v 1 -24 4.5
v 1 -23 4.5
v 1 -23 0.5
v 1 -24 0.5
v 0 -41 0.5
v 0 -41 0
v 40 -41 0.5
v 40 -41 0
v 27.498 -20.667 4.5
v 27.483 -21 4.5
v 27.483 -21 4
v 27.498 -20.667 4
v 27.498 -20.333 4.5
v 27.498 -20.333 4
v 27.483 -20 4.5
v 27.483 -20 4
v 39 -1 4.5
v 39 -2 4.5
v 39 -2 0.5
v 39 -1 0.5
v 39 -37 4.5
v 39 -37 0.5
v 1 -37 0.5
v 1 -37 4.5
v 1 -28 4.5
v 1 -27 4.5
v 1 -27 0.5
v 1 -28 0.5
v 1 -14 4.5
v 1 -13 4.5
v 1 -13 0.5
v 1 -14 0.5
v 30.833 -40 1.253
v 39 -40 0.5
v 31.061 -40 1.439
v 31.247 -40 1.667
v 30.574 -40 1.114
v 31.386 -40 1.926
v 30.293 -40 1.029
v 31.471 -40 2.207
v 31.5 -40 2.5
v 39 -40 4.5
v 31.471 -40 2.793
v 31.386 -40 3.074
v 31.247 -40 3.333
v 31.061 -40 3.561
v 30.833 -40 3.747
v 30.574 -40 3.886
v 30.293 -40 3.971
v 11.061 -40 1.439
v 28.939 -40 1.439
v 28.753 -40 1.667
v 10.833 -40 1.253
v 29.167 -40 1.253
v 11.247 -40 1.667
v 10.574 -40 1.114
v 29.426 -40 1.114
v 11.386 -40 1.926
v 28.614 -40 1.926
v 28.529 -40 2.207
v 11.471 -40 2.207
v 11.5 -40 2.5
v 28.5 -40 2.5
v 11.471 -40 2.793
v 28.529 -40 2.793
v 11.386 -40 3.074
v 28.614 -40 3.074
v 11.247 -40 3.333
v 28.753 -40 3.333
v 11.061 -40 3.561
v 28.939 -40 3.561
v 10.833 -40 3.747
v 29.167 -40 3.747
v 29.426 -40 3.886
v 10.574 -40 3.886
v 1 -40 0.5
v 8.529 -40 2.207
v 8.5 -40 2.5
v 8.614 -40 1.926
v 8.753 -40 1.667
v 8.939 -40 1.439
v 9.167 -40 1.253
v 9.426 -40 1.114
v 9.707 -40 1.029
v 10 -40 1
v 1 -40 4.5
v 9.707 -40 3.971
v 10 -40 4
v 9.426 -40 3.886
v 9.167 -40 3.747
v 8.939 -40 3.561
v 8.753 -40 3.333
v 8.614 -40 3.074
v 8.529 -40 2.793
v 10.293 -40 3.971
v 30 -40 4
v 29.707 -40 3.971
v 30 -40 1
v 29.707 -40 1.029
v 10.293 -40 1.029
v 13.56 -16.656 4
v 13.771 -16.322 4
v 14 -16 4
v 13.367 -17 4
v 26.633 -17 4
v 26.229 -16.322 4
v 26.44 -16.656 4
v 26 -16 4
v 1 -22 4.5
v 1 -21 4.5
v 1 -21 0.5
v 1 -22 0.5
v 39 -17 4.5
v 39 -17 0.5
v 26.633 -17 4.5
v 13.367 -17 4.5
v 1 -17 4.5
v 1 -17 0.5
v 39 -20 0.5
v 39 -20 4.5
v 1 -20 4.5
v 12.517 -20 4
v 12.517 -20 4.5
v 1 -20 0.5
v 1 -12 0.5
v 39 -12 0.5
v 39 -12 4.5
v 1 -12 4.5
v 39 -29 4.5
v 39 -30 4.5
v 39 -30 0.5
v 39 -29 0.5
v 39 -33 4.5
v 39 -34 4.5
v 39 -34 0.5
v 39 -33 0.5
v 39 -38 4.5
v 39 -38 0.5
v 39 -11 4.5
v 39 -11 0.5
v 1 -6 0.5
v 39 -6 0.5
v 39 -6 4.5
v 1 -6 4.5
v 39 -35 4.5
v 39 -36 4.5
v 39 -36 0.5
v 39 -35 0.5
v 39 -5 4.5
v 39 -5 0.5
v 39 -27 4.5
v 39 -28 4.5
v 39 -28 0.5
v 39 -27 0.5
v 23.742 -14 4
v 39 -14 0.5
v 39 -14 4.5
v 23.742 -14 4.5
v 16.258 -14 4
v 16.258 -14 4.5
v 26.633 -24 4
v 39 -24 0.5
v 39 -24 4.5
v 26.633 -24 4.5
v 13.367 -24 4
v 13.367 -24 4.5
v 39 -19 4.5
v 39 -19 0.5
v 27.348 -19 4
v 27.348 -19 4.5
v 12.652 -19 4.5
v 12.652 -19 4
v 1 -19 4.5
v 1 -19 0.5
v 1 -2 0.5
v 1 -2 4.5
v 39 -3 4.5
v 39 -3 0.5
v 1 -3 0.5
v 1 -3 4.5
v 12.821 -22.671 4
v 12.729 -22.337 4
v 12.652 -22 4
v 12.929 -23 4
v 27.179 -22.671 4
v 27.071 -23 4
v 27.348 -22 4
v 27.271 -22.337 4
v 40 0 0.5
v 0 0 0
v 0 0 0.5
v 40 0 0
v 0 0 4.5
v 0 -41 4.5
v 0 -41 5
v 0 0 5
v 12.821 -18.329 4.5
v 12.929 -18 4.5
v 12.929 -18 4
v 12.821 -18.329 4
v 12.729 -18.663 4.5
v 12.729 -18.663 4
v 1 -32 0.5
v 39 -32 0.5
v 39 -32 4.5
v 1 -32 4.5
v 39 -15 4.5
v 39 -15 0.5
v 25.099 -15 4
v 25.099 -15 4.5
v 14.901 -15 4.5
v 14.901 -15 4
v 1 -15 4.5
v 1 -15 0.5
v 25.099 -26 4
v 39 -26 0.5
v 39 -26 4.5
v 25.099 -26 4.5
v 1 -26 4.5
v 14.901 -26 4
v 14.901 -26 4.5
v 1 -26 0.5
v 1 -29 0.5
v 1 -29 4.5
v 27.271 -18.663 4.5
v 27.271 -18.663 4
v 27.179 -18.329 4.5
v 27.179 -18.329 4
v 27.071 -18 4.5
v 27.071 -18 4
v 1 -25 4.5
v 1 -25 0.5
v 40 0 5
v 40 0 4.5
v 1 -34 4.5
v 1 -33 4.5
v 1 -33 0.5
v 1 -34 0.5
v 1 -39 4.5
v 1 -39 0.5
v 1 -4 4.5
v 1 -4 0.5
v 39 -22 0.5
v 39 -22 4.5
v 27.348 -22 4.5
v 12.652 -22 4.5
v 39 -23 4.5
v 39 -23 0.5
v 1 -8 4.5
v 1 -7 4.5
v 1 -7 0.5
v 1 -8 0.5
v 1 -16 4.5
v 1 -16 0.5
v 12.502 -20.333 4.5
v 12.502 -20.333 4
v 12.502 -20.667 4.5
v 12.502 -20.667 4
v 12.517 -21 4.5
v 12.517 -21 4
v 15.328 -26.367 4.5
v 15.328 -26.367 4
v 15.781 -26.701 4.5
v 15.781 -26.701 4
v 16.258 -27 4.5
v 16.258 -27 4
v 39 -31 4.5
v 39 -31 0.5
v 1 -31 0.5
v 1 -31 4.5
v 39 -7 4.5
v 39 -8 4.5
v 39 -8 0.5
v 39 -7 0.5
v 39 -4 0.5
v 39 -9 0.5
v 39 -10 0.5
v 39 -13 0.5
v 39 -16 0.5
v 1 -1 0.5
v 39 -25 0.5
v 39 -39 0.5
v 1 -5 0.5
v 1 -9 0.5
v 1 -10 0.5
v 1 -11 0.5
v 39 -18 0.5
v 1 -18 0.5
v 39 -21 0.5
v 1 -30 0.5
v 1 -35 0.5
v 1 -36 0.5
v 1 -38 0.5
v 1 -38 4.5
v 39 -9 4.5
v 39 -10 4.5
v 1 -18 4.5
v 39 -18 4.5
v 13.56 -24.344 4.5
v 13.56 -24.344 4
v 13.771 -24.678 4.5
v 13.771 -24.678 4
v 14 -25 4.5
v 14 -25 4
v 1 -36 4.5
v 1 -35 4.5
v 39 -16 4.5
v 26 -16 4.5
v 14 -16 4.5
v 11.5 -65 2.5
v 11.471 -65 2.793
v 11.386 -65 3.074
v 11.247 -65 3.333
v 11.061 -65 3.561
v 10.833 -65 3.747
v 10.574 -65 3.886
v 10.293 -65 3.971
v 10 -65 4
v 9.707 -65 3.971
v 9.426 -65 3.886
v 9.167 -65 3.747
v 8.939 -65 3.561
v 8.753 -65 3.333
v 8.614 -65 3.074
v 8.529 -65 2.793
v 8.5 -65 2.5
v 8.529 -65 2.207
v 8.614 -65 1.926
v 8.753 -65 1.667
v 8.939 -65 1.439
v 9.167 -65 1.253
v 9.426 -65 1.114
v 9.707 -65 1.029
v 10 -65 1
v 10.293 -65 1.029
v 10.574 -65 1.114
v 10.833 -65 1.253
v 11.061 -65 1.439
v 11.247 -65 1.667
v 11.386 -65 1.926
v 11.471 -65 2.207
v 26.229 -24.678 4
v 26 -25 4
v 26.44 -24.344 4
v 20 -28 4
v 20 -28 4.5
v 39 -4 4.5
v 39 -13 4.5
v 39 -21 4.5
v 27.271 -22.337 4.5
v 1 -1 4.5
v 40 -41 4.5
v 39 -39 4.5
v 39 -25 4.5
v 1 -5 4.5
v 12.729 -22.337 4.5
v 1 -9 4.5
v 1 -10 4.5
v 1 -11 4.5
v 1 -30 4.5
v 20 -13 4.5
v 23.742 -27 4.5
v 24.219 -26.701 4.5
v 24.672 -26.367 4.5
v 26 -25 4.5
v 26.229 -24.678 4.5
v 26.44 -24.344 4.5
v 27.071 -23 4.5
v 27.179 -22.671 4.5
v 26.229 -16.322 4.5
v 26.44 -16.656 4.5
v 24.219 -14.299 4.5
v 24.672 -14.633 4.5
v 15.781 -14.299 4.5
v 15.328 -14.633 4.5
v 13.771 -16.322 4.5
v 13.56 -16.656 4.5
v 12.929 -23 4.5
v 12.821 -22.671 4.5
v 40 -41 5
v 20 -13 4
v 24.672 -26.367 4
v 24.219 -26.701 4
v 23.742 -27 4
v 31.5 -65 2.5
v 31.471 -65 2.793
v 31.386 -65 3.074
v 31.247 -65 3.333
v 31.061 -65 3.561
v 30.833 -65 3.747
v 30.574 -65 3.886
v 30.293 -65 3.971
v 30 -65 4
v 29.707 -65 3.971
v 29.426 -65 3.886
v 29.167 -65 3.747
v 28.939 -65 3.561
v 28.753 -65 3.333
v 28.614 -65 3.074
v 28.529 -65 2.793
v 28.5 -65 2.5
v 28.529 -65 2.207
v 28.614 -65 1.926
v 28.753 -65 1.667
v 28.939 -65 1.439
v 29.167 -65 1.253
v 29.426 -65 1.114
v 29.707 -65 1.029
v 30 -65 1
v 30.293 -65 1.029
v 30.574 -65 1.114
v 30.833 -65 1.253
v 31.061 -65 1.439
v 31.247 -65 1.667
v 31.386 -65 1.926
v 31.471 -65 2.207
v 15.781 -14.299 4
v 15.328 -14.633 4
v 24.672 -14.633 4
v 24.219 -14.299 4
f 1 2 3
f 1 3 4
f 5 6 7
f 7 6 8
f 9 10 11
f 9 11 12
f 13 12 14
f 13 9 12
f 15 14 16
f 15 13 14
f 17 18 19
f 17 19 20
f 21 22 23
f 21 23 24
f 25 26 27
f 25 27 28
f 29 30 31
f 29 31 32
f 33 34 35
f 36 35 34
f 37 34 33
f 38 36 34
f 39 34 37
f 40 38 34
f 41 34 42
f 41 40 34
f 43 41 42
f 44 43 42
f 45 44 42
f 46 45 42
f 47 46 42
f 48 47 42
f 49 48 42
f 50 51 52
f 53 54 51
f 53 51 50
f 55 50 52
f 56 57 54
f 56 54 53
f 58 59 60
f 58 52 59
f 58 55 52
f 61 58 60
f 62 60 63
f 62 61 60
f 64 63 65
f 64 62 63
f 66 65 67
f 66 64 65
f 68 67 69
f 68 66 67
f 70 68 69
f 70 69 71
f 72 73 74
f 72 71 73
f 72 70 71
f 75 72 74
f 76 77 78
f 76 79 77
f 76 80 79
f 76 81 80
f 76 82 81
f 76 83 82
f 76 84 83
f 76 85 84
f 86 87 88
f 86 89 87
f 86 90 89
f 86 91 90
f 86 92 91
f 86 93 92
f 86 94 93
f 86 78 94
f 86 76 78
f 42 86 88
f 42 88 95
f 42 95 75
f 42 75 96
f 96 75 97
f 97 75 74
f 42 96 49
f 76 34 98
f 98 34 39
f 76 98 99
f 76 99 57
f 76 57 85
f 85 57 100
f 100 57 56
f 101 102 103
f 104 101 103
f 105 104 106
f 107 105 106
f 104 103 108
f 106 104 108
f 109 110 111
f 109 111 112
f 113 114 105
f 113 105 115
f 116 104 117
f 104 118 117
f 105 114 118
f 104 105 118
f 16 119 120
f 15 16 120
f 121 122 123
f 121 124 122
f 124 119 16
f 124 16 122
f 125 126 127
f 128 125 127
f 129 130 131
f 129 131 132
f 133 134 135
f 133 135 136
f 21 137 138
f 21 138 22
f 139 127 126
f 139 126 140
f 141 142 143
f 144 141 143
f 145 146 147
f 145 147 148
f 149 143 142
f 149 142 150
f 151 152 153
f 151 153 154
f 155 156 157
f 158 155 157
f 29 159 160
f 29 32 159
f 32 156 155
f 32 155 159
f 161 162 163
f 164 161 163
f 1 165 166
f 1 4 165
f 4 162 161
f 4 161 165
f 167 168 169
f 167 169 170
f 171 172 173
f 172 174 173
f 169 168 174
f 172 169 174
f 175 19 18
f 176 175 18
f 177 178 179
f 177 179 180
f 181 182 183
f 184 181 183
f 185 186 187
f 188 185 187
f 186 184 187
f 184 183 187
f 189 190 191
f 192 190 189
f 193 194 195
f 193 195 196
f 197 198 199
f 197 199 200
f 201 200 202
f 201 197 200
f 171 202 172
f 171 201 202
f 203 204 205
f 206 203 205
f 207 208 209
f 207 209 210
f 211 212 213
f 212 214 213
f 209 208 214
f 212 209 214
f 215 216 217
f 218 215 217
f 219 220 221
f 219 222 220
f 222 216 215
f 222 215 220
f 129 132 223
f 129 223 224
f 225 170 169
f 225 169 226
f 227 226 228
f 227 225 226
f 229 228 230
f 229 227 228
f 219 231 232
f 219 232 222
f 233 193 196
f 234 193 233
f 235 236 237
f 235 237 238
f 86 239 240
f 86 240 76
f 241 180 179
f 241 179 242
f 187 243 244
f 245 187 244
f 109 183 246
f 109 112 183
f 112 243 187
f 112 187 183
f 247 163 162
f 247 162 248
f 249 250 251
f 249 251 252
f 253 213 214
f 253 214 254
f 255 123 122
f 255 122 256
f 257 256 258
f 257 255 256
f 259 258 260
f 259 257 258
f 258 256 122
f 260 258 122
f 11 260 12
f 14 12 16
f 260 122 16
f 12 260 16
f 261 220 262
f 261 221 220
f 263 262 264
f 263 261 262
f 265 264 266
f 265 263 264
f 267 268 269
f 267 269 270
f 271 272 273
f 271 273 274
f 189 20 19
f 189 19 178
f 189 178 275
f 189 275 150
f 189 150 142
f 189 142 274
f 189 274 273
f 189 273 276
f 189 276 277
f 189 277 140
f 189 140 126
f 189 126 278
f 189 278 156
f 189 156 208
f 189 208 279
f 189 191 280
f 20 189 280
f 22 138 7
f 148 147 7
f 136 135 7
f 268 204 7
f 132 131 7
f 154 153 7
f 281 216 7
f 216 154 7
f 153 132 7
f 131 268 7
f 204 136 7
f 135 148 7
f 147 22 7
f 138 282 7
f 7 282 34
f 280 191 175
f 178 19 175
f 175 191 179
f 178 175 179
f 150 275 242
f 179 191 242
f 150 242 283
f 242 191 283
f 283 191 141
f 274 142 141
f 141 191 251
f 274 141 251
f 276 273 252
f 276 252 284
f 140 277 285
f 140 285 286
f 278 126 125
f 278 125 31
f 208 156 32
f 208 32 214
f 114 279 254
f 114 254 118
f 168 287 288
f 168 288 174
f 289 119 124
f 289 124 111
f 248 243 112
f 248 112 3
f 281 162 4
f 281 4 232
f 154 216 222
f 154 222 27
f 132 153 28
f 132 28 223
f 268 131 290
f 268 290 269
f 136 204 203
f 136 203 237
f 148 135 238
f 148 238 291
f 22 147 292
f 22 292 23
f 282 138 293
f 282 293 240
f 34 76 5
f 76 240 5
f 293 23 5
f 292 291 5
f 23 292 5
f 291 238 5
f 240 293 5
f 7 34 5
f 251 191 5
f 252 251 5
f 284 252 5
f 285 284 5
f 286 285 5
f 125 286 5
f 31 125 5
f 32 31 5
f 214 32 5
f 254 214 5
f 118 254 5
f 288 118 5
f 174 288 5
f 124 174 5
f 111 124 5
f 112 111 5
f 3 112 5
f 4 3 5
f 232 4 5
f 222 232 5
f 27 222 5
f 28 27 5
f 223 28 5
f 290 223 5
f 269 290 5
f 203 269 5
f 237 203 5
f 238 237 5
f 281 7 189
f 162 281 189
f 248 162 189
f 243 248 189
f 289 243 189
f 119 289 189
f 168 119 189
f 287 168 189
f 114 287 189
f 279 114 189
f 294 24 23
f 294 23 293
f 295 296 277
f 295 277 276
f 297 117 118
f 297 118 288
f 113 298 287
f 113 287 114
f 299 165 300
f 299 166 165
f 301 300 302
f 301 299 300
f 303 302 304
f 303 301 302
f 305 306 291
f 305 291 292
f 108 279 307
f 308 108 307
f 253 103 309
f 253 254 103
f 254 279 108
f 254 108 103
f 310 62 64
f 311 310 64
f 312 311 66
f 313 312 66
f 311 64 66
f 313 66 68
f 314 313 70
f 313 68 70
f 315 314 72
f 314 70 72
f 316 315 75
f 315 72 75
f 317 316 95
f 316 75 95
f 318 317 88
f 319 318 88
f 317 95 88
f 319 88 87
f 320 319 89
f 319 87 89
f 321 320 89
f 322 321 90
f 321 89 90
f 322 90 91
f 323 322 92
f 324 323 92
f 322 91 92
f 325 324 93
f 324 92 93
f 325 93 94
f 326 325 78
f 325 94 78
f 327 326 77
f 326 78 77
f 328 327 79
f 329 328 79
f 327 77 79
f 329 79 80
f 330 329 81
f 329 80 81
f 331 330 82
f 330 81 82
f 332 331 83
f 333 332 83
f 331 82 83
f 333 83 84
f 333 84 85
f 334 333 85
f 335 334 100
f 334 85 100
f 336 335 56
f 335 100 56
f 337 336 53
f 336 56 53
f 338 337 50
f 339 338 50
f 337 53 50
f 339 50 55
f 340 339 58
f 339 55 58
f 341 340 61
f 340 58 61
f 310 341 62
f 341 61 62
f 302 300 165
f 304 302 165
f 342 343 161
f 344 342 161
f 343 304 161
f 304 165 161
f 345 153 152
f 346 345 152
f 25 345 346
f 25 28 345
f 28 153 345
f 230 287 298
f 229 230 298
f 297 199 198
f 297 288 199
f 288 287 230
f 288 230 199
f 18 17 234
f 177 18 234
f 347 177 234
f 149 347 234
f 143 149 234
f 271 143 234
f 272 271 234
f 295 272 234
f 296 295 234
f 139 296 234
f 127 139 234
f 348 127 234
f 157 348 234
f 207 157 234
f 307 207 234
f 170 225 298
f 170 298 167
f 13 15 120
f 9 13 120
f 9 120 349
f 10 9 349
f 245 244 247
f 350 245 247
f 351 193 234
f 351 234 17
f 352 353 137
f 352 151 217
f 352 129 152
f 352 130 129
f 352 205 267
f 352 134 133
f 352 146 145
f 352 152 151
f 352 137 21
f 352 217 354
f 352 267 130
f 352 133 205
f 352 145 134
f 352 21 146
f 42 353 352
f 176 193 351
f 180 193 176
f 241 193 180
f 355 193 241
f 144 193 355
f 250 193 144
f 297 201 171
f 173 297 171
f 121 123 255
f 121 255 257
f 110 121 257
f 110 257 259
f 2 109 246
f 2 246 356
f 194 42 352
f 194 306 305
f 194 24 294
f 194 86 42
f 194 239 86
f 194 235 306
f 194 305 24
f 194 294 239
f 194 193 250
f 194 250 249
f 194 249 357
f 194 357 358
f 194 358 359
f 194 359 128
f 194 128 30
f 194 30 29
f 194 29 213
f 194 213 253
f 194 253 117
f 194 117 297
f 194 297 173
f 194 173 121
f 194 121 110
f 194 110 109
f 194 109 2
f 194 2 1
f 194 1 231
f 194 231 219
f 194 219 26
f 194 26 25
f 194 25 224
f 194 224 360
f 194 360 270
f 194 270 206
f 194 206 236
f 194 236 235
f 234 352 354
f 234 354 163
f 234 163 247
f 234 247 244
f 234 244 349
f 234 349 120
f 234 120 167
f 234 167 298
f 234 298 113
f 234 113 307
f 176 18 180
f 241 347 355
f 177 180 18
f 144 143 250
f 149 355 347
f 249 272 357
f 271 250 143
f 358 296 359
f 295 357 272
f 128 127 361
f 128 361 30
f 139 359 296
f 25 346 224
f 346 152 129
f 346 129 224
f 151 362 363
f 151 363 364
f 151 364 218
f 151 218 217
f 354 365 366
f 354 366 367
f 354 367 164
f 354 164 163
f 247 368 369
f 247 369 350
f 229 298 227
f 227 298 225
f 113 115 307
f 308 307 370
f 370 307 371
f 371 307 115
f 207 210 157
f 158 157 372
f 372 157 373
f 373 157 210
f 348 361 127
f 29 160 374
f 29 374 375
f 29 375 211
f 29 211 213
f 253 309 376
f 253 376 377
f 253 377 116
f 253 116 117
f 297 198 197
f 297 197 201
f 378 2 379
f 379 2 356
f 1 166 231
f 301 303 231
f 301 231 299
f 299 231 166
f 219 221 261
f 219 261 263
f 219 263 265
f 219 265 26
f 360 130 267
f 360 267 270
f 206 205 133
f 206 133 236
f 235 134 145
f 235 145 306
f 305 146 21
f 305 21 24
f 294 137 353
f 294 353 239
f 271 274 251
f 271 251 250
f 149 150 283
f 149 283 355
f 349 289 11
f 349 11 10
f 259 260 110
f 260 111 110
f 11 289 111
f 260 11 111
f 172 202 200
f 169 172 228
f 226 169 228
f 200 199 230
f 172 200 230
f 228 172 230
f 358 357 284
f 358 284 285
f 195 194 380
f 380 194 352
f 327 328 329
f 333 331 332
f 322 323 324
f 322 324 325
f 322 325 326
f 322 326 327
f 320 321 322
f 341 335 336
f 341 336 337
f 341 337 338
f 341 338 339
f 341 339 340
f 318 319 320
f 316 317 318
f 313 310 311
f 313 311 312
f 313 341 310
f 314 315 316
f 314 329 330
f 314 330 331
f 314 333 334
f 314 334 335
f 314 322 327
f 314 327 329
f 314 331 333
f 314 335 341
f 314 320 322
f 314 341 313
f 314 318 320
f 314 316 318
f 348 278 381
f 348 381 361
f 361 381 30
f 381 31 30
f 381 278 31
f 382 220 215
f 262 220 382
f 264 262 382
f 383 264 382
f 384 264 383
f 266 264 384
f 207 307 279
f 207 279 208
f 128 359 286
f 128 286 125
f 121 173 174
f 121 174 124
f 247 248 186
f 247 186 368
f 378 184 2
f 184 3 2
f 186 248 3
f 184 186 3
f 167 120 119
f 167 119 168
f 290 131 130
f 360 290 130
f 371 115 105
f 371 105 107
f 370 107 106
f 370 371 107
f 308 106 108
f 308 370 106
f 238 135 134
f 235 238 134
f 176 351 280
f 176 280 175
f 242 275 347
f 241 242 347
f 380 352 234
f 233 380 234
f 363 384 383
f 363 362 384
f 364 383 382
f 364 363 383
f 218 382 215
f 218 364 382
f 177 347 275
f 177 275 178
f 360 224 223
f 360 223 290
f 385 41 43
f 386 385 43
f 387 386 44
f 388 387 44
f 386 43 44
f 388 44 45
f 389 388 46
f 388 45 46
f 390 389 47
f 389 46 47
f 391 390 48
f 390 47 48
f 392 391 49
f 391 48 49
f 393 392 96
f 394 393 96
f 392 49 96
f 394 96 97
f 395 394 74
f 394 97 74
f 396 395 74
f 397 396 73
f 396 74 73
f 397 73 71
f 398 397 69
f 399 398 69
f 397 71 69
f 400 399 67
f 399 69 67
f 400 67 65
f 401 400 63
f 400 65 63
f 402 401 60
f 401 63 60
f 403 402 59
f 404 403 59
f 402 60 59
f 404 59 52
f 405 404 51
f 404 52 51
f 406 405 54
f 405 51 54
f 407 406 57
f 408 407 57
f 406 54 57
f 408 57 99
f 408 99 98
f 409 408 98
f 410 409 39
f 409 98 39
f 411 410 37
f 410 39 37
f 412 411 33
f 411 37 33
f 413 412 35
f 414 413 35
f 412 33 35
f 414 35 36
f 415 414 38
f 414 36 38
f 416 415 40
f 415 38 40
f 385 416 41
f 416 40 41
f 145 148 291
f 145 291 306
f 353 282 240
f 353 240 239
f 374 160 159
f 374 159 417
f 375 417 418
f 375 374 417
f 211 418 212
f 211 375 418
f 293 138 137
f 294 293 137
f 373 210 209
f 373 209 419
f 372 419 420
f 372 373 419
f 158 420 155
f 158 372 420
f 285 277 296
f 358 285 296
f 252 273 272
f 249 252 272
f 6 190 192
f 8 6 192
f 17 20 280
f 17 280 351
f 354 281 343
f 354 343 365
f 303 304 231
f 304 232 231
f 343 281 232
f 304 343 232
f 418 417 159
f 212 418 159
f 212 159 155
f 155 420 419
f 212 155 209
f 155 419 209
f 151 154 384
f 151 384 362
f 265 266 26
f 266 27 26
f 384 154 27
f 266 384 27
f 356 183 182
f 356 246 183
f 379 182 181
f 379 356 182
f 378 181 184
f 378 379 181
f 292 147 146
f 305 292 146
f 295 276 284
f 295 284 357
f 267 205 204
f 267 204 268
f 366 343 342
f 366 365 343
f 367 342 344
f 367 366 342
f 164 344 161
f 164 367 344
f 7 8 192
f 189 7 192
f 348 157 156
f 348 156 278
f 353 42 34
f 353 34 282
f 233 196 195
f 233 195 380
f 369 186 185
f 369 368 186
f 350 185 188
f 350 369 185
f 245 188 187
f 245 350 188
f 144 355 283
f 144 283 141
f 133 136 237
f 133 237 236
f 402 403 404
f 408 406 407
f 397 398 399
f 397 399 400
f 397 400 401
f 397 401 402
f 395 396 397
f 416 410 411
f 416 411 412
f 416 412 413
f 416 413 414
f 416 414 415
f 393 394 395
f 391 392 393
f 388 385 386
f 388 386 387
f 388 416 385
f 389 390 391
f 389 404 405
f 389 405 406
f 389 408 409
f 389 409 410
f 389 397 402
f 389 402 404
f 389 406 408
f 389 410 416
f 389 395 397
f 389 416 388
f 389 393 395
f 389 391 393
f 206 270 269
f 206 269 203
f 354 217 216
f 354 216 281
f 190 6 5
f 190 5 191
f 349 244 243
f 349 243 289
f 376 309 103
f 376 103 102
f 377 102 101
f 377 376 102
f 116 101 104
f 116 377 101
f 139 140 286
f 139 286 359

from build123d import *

# Parameters (mm, degrees)
F0_W      = 40
F0_H      = 41
F1_DEPTH  = 5
F2_W      = 1
F2_H      = 4
F3_DEPTH  = 40.001
F4_W      = 40
F4_H      = 4
F5_DEPTH  = 1
F6_W      = 40
F6_H      = 4
F7_DEPTH  = 1
F8_R      = 1.5
F9_DEPTH  = 25
F10_R     = 7.5
F11_DEPTH = 1


with BuildPart() as f1:
    # F0 (on Top) → F1 (new body)
    with BuildSketch(Plane.XY):
        with Locations((20, -20.5)):
            Rectangle(F0_W, F0_H)
    extrude(amount=F1_DEPTH)

    # F2 (on face) → F3 (cut, through all)
    with BuildSketch(Plane(origin=(0, 0, 0), x_dir=(0, -1, 0), z_dir=(-1, 0, 0))):
        with Locations((0.5, 2.5)):
            Rectangle(F2_W, F2_H)
        with Locations((2.5, 2.5)):
            Rectangle(F2_W, F2_H)
        with Locations((4.5, 2.5)):
            Rectangle(F2_W, F2_H)
        with Locations((6.5, 2.5)):
            Rectangle(F2_W, F2_H)
        with Locations((8.5, 2.5)):
            Rectangle(F2_W, F2_H)
        with Locations((10.5, 2.5)):
            Rectangle(F2_W, F2_H)
        with Locations((12.5, 2.5)):
            Rectangle(F2_W, F2_H)
        with Locations((14.5, 2.5)):
            Rectangle(F2_W, F2_H)
        with Locations((16.5, 2.5)):
            Rectangle(F2_W, F2_H)
        with Locations((18.5, 2.5)):
            Rectangle(F2_W, F2_H)
        with Locations((20.5, 2.5)):
            Rectangle(F2_W, F2_H)
        with Locations((22.5, 2.5)):
            Rectangle(F2_W, F2_H)
        with Locations((24.5, 2.5)):
            Rectangle(F2_W, F2_H)
        with Locations((26.5, 2.5)):
            Rectangle(F2_W, F2_H)
        with Locations((28.5, 2.5)):
            Rectangle(F2_W, F2_H)
        with Locations((30.5, 2.5)):
            Rectangle(F2_W, F2_H)
        with Locations((32.5, 2.5)):
            Rectangle(F2_W, F2_H)
        with Locations((34.5, 2.5)):
            Rectangle(F2_W, F2_H)
        with Locations((36.5, 2.5)):
            Rectangle(F2_W, F2_H)
        with Locations((38.5, 2.5)):
            Rectangle(F2_W, F2_H)
        with Locations((40.5, 2.5)):
            Rectangle(F2_W, F2_H)
    extrude(amount=-F3_DEPTH, mode=Mode.SUBTRACT)

    # F4 (on face) → F5 (cut)
    with BuildSketch(Plane(origin=(0, 0, 0), x_dir=(0, -1, 0), z_dir=(-1, 0, 0))):
        with Locations((21, 2.5)):
            Rectangle(F4_W, F4_H)
    extrude(amount=-F5_DEPTH, mode=Mode.SUBTRACT)

    # F6 (on face) → F7 (cut)
    with BuildSketch(Plane.YZ.offset(40)):
        with Locations((-21, 2.5)):
            Rectangle(F6_W, F6_H)
    extrude(amount=-F7_DEPTH, mode=Mode.SUBTRACT)

    # F8 (on face) → F9 (join)
    with BuildSketch(Plane.XZ.offset(40)):
        with Locations((10, 2.5)):
            Circle(F8_R)
        with Locations((30, 2.5)):
            Circle(F8_R)
    extrude(amount=F9_DEPTH)

    # F10 (on face) → F11 (join)
    with BuildSketch(Plane.XY.offset(5)):
        with Locations((20, -20.5)):
            Circle(F10_R)
    extrude(amount=-F11_DEPTH)


solid = f1.part
